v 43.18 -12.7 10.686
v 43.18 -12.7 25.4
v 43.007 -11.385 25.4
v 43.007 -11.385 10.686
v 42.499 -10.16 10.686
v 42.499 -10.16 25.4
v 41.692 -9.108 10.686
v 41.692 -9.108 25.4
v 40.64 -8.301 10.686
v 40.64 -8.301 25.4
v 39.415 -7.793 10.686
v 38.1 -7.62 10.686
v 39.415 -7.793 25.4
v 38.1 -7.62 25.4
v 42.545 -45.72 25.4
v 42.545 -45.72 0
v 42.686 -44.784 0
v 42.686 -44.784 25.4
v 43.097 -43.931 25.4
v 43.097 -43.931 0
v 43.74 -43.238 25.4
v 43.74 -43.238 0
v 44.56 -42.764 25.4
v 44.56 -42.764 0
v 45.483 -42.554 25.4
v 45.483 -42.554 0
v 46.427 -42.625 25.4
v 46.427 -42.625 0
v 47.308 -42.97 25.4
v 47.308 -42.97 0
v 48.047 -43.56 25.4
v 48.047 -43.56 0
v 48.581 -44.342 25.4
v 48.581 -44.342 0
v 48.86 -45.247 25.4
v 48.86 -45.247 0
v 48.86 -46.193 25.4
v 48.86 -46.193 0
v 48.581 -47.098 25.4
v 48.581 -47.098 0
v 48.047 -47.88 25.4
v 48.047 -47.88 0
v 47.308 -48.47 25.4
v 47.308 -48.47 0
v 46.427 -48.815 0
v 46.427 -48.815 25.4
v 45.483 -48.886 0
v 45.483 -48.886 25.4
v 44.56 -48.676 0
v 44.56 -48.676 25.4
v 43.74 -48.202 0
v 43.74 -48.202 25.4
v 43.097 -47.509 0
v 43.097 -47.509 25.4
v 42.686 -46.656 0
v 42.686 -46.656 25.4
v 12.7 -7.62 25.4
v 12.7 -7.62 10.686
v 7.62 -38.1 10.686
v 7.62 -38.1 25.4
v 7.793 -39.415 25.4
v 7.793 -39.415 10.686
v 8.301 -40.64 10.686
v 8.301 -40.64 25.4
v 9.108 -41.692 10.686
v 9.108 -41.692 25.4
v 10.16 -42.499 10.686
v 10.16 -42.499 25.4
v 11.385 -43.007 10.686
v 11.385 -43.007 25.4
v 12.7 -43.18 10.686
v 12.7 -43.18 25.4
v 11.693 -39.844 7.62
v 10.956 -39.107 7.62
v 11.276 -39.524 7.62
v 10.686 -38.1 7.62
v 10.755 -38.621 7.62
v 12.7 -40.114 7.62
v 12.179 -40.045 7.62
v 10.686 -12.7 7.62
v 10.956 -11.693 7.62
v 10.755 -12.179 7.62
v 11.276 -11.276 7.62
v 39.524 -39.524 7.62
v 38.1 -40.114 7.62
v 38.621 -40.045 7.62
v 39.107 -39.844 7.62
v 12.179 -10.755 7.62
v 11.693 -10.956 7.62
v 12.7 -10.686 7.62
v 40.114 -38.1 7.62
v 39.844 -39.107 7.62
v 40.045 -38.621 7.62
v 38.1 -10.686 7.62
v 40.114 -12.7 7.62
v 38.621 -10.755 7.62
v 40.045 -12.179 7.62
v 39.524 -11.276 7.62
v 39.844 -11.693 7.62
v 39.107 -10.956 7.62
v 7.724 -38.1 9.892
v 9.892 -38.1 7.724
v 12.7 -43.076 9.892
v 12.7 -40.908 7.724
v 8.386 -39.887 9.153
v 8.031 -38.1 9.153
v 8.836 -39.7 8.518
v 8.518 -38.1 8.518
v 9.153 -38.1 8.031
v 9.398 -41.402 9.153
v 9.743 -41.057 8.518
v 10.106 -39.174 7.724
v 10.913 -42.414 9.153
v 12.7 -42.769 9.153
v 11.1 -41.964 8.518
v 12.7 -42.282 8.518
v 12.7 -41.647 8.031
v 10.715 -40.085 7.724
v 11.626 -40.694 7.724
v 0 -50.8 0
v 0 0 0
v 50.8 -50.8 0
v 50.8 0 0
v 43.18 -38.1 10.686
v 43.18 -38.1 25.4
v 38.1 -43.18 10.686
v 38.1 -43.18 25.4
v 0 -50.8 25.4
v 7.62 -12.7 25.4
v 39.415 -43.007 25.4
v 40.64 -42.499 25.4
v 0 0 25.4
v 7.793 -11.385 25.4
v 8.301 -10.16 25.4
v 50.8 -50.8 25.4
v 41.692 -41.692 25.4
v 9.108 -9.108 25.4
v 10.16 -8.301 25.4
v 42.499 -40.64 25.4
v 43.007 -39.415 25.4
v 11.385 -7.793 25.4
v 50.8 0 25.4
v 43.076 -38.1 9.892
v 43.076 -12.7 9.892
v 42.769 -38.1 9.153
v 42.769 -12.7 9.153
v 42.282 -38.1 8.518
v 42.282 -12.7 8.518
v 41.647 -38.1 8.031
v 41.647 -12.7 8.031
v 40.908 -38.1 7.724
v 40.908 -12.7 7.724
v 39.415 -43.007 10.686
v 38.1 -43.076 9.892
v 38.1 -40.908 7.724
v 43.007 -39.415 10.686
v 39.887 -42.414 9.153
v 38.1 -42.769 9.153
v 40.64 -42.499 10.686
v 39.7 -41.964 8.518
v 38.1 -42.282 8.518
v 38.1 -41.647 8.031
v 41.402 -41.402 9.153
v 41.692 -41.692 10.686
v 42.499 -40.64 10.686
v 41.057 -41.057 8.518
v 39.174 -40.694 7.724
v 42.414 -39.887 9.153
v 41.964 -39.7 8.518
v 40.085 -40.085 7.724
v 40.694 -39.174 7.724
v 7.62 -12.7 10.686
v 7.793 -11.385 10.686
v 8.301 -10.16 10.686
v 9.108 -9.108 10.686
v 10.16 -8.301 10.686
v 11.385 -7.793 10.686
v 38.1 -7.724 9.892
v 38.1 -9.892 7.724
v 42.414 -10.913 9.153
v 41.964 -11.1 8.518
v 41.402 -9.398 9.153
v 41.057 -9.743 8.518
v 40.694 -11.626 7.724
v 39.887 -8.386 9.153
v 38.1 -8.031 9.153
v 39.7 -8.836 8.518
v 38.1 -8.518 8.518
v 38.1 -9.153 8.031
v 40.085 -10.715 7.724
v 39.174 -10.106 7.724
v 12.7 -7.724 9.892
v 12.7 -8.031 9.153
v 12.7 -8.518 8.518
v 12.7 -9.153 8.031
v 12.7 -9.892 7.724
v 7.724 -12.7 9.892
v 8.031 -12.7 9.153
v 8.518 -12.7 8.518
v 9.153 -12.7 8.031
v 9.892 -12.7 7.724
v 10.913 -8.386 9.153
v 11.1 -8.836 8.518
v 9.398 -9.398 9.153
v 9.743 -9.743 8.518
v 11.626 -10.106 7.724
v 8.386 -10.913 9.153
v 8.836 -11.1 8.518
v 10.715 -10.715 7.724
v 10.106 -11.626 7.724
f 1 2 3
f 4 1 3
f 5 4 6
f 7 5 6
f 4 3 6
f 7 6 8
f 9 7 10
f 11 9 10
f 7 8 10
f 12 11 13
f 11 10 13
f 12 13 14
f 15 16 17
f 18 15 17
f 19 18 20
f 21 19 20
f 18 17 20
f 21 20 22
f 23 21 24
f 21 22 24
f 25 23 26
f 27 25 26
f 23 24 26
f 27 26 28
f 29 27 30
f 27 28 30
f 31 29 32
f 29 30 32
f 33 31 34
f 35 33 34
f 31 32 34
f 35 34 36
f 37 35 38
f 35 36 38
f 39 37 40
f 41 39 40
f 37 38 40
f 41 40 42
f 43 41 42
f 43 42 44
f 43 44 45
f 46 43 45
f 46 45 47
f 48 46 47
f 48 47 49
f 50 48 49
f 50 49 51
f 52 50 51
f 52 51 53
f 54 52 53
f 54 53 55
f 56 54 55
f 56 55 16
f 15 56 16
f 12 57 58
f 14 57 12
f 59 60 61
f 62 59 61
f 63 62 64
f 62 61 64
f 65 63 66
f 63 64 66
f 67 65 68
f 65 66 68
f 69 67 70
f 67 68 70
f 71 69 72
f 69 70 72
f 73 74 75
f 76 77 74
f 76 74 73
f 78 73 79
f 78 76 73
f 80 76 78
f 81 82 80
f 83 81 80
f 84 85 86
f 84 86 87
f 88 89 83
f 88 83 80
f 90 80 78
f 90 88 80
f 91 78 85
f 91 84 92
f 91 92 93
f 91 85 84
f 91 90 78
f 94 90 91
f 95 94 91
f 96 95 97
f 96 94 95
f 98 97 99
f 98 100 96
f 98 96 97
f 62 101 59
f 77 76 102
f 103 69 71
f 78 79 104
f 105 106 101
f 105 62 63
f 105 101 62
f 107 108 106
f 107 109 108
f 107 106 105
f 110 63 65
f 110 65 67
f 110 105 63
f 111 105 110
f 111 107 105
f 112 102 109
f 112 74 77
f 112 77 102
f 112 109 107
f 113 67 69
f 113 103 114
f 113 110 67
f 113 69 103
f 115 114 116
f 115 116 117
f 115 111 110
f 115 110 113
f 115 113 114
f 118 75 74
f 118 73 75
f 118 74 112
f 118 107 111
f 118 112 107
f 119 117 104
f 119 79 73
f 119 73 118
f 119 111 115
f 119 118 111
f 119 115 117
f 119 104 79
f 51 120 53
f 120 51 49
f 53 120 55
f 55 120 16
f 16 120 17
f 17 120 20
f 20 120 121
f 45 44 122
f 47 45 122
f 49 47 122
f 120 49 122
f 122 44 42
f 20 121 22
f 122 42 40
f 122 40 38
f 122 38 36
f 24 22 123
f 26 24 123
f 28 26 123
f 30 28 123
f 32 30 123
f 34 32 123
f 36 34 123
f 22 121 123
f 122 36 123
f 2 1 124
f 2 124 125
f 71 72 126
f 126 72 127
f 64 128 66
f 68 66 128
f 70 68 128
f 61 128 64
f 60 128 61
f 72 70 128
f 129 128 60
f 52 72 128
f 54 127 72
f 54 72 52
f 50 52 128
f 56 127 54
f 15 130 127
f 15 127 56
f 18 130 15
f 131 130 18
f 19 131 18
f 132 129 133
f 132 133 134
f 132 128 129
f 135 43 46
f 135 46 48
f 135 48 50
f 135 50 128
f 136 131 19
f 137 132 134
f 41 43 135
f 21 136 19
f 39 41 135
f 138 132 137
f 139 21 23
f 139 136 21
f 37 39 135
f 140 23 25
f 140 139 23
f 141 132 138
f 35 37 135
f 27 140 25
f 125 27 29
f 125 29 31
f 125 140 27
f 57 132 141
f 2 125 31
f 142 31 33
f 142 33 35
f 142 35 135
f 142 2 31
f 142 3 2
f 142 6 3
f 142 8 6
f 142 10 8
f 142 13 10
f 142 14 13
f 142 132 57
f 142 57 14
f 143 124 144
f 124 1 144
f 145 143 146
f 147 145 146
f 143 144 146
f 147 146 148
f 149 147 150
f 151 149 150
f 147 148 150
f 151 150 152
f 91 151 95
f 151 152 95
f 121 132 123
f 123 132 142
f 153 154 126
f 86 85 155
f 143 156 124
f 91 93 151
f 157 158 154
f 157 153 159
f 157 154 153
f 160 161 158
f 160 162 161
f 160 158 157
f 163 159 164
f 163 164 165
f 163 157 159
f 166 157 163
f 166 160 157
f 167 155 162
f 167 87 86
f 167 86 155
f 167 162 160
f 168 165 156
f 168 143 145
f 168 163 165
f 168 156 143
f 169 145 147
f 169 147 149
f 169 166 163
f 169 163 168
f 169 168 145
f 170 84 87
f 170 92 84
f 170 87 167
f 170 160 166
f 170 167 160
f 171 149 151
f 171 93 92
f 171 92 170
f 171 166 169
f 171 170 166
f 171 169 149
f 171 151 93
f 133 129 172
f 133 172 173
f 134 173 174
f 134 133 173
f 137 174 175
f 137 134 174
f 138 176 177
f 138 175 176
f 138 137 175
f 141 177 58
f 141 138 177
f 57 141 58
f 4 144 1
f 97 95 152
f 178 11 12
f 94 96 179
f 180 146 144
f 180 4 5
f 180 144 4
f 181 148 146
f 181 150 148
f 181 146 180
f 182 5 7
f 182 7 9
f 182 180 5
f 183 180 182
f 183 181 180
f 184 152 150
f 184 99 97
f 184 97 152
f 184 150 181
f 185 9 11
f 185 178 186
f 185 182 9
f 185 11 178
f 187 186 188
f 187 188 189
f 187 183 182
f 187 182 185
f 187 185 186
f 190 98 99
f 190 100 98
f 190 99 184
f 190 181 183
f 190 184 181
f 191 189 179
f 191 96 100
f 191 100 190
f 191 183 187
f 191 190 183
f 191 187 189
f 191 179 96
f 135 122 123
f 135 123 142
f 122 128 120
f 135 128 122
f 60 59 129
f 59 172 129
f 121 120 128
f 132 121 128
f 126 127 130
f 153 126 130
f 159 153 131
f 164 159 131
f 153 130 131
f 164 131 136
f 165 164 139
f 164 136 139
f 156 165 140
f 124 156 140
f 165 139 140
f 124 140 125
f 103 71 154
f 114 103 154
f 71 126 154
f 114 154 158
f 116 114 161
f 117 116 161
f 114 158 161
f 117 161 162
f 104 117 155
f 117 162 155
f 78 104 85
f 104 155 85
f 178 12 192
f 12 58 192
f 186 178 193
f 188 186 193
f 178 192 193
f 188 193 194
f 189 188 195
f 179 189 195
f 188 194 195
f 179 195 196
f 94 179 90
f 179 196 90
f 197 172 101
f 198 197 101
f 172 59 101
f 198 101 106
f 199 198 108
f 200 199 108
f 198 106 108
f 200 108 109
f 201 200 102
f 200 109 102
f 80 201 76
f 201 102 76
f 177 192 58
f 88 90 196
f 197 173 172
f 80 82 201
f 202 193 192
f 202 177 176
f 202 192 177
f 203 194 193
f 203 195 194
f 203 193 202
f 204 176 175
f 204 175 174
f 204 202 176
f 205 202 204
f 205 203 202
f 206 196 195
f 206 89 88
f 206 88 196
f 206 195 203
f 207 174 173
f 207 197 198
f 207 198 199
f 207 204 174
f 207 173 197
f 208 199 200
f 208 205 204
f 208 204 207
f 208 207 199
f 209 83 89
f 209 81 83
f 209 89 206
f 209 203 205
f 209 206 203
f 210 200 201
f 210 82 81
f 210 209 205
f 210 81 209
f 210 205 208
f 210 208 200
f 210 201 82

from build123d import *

# Parameters (mm, degrees)
F0_W     = 50.8
F0_H     = 25.4
F1_DEPTH = 50.8
F2_T     = -7.62
F3_R     = 5.08
F4_R     = 5.08
F5_R     = 5.08
F6_R     = 5.08
F8_D     = 6.35
F9_R     = 3.0660512242


with BuildPart() as f1:
    # F0 (on Front) → F1 (new body)
    with BuildSketch(Plane.XZ):
        with Locations((25.4, 12.7)):
            Rectangle(F0_W, F0_H)
    extrude(amount=F1_DEPTH)

    # F2
    f2_openings = [f1.faces().sort_by_distance(p)[0] for p in [
        (25.4, -25.4, 25.4),
    ]]
    offset(amount=F2_T, openings=f2_openings)

    # F3
    f3_edges = [f1.edges().sort_by_distance(p)[0] for p in [
        (7.62, -7.62, 16.51),
    ]]
    fillet(f3_edges, radius=F3_R)

    # F4
    f4_edges = [f1.edges().sort_by_distance(p)[0] for p in [
        (7.62, -43.18, 16.51),
    ]]
    fillet(f4_edges, radius=F4_R)

    # F5
    f5_edges = [f1.edges().sort_by_distance(p)[0] for p in [
        (43.18, -43.18, 16.51),
    ]]
    fillet(f5_edges, radius=F5_R)

    # F6
    f6_edges = [f1.edges().sort_by_distance(p)[0] for p in [
        (43.18, -7.62, 16.51),
    ]]
    fillet(f6_edges, radius=F6_R)

    # F8 (through all)
    with Locations(Plane.XY.offset(25.4)):
        with Locations((45.72, -45.72)):
            Hole(F8_D / 2)

    # F9
    f9_edges = [f1.edges().sort_by_distance(p)[0] for p in [
        (25.4, -7.62, 7.62),
    ]]
    fillet(f9_edges, radius=F9_R)


solid = f1.part
